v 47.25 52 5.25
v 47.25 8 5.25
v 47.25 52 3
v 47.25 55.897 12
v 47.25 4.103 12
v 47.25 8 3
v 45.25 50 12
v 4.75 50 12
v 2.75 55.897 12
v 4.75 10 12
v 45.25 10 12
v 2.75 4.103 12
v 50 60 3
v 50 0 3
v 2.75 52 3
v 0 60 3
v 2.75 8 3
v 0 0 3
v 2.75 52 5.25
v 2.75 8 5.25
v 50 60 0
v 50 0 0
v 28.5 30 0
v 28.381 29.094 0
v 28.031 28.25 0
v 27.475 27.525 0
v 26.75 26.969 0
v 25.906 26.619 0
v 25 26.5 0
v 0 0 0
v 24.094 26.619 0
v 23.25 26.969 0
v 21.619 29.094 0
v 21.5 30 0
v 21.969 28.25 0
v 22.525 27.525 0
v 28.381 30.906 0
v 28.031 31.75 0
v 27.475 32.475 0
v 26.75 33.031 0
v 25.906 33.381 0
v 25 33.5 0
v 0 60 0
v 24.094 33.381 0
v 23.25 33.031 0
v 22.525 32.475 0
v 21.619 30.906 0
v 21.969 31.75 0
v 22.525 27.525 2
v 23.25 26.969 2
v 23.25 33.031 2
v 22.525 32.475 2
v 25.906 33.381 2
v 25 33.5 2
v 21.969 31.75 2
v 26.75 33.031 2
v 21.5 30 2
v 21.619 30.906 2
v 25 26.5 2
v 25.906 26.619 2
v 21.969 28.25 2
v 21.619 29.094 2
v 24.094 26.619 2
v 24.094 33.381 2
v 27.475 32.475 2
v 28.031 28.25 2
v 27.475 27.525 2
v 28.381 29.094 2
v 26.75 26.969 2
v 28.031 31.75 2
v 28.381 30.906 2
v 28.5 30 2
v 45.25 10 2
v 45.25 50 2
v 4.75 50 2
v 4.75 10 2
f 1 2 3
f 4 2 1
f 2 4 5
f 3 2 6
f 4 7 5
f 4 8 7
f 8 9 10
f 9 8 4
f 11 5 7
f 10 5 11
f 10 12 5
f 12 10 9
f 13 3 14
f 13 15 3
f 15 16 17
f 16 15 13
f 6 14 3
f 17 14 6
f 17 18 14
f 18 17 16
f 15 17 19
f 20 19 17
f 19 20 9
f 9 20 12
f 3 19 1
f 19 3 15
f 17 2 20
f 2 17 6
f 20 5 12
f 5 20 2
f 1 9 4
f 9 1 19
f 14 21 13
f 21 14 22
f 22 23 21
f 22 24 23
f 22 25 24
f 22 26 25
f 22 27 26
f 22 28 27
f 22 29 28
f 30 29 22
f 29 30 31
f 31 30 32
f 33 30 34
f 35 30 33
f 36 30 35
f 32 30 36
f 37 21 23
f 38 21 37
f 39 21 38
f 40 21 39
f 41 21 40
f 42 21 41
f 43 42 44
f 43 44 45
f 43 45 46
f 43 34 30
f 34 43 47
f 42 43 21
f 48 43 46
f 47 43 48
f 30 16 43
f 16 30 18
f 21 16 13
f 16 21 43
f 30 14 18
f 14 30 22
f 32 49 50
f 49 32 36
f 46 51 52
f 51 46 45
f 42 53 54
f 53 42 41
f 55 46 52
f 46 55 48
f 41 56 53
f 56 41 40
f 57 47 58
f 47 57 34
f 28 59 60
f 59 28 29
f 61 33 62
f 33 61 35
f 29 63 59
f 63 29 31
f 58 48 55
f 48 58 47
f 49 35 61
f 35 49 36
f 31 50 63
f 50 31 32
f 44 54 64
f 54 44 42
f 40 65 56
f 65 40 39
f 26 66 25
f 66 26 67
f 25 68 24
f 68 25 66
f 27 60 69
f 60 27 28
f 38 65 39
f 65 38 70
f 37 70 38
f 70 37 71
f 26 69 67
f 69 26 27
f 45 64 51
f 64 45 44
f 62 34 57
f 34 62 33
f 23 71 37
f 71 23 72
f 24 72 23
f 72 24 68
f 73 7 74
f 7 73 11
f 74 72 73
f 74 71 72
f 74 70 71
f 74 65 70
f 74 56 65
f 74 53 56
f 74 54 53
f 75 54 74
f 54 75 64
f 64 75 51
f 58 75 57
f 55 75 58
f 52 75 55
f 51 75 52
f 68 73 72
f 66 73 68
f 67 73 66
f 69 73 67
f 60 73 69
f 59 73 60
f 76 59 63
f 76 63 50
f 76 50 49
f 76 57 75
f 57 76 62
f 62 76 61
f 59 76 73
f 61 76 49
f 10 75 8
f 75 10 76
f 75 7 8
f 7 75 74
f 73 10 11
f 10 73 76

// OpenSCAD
/* Camera Quick Release Plate */

/* NOTE: 
	width = x
	length = y
	height/depth = z)
*/

/* Base Plate Variables */
base_width = 50;
base_length = 60;
base_height = 3;

/* Clamp Variables */

clamp_width = 44.5;
clamp_length = 44;
clamp_height = 9;
clamp_slope_height = 9;

/* Hole Variables */
bolt_hole_dia = 7;
spot_face_dia = clamp_width-5;
spot_face_depth = 10;
wall_thickness = 2;

module base()
{
	cube([base_width,base_length,base_height]);
}

module clamp()
{

union()
{
	cube([clamp_width,clamp_length,clamp_height]);
//translate and rotate these so that they are on each end and lying flat and triangly
	translate([0,0,clamp_height - clamp_slope_height/4]) rotate([0,90,0])
	cylinder( d = clamp_slope_height, h = clamp_width, $fn = 3);
	translate([0,clamp_length,clamp_height - clamp_slope_height/4]) rotate([0,90,0])
	cylinder( d = clamp_slope_height, h = clamp_width, $fn = 3);
}

}

module hole()
{
rotate([0,180,0]) //rotates it round to act like a drill
{
	cylinder(d = bolt_hole_dia, h = clamp_height+base_height+2, $fn = 24);
	//cylinder(d = spot_face_dia, h = spot_face_depth+1);

}

}


/* Main Code  # */

difference()
{
union()
	{
		base();
		translate([(base_width-clamp_width)/2,(base_length-clamp_length)/2, base_height])
			{
				clamp();
			}
	
}
translate([base_width/2, base_length/2, base_height+clamp_height+1])
	{
		hole();
	}
			translate([(base_width-clamp_width)/2 + wall_thickness,(base_length-clamp_length)/2 + wall_thickness, wall_thickness])
	cube([clamp_width-2*wall_thickness,clamp_length-2*wall_thickness,base_height+clamp_height-wall_thickness+1]);
}
